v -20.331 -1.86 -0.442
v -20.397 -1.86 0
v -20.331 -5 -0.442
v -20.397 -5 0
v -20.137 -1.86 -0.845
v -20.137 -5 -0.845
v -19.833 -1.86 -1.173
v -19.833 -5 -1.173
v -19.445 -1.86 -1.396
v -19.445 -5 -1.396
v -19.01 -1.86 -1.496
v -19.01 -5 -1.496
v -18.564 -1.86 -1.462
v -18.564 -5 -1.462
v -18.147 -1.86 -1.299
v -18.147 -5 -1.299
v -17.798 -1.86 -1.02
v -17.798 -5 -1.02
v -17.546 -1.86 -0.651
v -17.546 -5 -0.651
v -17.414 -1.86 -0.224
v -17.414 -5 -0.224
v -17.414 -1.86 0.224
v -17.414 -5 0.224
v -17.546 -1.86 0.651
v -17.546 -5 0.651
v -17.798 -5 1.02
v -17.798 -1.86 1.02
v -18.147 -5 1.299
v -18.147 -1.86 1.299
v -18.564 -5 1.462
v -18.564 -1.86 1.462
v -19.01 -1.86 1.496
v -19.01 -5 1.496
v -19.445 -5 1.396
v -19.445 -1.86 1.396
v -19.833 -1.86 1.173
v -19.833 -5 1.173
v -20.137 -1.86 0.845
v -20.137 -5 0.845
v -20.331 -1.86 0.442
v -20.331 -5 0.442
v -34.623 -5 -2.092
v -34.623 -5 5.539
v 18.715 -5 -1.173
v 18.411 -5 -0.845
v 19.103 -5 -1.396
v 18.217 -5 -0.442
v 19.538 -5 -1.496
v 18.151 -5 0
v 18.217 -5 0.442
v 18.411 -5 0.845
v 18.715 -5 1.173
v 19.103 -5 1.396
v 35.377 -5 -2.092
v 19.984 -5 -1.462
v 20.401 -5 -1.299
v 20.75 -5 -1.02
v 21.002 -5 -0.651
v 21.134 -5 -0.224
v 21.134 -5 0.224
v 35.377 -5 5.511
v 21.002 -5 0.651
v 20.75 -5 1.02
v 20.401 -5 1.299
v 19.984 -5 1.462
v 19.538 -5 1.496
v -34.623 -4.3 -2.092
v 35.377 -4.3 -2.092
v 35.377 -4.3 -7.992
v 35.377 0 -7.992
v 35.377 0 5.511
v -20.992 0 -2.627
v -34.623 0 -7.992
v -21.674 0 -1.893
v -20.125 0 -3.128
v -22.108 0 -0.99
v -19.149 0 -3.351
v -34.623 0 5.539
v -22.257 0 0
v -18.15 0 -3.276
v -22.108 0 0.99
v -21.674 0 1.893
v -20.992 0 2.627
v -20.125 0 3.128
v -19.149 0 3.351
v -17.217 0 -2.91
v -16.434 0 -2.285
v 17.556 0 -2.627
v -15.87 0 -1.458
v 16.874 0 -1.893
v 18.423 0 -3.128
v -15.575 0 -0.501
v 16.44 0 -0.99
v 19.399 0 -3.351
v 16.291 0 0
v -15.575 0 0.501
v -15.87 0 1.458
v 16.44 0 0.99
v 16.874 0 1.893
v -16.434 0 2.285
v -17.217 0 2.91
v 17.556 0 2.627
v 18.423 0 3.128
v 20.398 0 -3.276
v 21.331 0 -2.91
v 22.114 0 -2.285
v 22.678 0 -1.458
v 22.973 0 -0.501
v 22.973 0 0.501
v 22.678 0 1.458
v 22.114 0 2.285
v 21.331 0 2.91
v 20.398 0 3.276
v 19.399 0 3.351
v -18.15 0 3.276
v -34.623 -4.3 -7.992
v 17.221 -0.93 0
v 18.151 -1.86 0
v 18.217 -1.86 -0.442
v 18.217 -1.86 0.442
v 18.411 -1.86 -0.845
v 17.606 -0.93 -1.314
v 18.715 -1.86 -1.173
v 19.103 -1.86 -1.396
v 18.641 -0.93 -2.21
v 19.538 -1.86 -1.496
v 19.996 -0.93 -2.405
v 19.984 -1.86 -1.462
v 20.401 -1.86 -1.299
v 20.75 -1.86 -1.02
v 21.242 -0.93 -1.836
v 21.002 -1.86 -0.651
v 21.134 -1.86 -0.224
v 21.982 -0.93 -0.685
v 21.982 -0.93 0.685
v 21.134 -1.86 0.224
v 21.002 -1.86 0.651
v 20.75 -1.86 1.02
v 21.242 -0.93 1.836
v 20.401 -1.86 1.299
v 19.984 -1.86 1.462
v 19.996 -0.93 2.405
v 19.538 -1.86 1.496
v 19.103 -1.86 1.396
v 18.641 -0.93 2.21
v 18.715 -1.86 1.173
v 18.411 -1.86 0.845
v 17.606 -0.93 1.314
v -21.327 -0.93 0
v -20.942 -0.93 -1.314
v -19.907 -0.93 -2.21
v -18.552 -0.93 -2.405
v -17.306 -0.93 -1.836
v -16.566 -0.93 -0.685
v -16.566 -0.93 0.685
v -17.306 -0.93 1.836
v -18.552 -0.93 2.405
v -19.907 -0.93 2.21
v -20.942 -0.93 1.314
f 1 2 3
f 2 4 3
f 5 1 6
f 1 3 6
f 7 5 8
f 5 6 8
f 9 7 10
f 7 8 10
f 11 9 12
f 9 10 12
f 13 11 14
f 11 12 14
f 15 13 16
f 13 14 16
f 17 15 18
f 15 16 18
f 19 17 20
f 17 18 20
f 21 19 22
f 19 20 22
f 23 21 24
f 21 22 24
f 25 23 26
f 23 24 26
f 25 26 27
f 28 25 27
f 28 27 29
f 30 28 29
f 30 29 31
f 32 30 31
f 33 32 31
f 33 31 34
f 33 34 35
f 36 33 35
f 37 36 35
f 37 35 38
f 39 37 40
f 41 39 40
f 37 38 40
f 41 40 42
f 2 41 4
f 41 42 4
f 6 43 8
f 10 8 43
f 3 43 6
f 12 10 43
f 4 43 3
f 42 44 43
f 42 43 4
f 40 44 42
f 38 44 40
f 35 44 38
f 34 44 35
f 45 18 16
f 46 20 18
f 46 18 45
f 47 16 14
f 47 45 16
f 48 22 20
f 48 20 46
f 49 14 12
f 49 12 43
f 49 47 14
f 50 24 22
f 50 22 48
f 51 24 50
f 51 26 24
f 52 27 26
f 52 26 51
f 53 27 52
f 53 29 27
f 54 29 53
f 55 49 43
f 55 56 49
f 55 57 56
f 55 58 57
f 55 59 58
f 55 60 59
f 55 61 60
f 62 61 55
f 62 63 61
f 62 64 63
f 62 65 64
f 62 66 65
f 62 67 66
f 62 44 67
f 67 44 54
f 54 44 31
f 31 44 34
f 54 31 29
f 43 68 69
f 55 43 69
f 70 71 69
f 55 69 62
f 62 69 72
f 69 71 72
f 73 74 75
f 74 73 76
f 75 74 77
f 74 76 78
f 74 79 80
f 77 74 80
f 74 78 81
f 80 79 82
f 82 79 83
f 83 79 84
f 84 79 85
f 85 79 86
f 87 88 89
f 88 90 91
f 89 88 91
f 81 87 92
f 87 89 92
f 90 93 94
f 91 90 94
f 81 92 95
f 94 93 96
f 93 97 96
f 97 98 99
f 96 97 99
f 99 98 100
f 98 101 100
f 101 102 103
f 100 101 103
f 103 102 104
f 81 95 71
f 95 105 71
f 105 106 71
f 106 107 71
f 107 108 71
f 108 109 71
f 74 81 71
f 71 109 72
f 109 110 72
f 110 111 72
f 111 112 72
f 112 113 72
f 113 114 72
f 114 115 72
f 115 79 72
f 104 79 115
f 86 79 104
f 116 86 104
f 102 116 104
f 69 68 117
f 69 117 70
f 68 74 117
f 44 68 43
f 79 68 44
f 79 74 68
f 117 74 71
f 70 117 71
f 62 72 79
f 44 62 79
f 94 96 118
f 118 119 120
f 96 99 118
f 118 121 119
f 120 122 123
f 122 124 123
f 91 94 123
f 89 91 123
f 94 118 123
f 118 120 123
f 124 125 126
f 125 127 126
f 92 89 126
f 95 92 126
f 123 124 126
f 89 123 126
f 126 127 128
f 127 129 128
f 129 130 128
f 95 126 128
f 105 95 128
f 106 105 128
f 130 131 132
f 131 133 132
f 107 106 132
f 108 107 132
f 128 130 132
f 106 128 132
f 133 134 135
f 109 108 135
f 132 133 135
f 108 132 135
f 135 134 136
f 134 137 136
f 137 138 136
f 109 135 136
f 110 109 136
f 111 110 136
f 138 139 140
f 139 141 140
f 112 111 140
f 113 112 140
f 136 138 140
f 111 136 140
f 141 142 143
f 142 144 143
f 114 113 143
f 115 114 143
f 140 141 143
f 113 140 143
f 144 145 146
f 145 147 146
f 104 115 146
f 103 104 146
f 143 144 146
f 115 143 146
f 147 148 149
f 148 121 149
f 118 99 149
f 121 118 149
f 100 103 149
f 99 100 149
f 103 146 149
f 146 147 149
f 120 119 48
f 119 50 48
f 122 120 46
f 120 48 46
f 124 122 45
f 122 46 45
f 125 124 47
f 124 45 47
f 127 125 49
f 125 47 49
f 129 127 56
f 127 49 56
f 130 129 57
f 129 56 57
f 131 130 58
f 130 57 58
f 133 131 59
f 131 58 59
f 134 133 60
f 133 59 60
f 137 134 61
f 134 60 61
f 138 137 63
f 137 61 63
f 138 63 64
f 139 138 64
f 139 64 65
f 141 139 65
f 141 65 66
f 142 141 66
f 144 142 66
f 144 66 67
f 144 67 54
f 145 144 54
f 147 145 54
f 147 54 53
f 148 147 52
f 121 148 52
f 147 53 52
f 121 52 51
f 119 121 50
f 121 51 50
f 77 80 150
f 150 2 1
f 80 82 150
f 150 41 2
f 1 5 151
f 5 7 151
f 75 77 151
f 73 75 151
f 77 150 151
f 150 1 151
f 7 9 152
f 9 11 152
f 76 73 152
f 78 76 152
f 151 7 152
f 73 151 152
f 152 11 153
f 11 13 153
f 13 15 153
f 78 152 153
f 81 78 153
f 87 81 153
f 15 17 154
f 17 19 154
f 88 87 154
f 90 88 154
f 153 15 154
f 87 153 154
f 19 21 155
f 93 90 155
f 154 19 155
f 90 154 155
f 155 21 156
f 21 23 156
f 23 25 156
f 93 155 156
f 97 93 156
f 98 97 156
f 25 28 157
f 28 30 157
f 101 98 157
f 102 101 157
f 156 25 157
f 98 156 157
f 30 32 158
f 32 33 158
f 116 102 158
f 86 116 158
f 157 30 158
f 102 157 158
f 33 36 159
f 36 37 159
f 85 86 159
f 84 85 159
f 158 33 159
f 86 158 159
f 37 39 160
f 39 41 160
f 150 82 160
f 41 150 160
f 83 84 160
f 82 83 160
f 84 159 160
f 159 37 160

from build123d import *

# Parameters (mm, degrees)
F1_DEPTH       = 5
F0_W           = 70
F0_H           = 5.9
F2_DEPTH       = 4.3
F3_D           = 3
F3_CSINK_D     = 6.72
F3_CSINK_ANGLE = 90


with BuildPart() as f1:
    # F0 (on Front) → F1 (new body)
    with BuildSketch(Plane.XZ):
        Polygon((-34.6234844969, 5.539), (-34.6234844969, 0), (-34.6234844969, -2.092), (35.3765155031, -2.092), (35.3765155031, 0), (35.3765155031, 5.511366824), align=None)
    extrude(amount=F1_DEPTH)

    # F0 (on Front) → F2 (join)
    with BuildSketch(Plane.XZ):
        with Locations((0.3765155031, -5.042)):
            Rectangle(F0_W, F0_H)
    extrude(amount=F2_DEPTH)

    # F3 (through all)
    with Locations(Plane(origin=(0, 0, 0), x_dir=(1, 0, 0), z_dir=(0, 1, 0))):
        with Locations((19.6505155031, 0), (-18.8974844969, 0)):
            CounterSinkHole(F3_D / 2, F3_CSINK_D / 2, counter_sink_angle=F3_CSINK_ANGLE)


solid = f1.part
